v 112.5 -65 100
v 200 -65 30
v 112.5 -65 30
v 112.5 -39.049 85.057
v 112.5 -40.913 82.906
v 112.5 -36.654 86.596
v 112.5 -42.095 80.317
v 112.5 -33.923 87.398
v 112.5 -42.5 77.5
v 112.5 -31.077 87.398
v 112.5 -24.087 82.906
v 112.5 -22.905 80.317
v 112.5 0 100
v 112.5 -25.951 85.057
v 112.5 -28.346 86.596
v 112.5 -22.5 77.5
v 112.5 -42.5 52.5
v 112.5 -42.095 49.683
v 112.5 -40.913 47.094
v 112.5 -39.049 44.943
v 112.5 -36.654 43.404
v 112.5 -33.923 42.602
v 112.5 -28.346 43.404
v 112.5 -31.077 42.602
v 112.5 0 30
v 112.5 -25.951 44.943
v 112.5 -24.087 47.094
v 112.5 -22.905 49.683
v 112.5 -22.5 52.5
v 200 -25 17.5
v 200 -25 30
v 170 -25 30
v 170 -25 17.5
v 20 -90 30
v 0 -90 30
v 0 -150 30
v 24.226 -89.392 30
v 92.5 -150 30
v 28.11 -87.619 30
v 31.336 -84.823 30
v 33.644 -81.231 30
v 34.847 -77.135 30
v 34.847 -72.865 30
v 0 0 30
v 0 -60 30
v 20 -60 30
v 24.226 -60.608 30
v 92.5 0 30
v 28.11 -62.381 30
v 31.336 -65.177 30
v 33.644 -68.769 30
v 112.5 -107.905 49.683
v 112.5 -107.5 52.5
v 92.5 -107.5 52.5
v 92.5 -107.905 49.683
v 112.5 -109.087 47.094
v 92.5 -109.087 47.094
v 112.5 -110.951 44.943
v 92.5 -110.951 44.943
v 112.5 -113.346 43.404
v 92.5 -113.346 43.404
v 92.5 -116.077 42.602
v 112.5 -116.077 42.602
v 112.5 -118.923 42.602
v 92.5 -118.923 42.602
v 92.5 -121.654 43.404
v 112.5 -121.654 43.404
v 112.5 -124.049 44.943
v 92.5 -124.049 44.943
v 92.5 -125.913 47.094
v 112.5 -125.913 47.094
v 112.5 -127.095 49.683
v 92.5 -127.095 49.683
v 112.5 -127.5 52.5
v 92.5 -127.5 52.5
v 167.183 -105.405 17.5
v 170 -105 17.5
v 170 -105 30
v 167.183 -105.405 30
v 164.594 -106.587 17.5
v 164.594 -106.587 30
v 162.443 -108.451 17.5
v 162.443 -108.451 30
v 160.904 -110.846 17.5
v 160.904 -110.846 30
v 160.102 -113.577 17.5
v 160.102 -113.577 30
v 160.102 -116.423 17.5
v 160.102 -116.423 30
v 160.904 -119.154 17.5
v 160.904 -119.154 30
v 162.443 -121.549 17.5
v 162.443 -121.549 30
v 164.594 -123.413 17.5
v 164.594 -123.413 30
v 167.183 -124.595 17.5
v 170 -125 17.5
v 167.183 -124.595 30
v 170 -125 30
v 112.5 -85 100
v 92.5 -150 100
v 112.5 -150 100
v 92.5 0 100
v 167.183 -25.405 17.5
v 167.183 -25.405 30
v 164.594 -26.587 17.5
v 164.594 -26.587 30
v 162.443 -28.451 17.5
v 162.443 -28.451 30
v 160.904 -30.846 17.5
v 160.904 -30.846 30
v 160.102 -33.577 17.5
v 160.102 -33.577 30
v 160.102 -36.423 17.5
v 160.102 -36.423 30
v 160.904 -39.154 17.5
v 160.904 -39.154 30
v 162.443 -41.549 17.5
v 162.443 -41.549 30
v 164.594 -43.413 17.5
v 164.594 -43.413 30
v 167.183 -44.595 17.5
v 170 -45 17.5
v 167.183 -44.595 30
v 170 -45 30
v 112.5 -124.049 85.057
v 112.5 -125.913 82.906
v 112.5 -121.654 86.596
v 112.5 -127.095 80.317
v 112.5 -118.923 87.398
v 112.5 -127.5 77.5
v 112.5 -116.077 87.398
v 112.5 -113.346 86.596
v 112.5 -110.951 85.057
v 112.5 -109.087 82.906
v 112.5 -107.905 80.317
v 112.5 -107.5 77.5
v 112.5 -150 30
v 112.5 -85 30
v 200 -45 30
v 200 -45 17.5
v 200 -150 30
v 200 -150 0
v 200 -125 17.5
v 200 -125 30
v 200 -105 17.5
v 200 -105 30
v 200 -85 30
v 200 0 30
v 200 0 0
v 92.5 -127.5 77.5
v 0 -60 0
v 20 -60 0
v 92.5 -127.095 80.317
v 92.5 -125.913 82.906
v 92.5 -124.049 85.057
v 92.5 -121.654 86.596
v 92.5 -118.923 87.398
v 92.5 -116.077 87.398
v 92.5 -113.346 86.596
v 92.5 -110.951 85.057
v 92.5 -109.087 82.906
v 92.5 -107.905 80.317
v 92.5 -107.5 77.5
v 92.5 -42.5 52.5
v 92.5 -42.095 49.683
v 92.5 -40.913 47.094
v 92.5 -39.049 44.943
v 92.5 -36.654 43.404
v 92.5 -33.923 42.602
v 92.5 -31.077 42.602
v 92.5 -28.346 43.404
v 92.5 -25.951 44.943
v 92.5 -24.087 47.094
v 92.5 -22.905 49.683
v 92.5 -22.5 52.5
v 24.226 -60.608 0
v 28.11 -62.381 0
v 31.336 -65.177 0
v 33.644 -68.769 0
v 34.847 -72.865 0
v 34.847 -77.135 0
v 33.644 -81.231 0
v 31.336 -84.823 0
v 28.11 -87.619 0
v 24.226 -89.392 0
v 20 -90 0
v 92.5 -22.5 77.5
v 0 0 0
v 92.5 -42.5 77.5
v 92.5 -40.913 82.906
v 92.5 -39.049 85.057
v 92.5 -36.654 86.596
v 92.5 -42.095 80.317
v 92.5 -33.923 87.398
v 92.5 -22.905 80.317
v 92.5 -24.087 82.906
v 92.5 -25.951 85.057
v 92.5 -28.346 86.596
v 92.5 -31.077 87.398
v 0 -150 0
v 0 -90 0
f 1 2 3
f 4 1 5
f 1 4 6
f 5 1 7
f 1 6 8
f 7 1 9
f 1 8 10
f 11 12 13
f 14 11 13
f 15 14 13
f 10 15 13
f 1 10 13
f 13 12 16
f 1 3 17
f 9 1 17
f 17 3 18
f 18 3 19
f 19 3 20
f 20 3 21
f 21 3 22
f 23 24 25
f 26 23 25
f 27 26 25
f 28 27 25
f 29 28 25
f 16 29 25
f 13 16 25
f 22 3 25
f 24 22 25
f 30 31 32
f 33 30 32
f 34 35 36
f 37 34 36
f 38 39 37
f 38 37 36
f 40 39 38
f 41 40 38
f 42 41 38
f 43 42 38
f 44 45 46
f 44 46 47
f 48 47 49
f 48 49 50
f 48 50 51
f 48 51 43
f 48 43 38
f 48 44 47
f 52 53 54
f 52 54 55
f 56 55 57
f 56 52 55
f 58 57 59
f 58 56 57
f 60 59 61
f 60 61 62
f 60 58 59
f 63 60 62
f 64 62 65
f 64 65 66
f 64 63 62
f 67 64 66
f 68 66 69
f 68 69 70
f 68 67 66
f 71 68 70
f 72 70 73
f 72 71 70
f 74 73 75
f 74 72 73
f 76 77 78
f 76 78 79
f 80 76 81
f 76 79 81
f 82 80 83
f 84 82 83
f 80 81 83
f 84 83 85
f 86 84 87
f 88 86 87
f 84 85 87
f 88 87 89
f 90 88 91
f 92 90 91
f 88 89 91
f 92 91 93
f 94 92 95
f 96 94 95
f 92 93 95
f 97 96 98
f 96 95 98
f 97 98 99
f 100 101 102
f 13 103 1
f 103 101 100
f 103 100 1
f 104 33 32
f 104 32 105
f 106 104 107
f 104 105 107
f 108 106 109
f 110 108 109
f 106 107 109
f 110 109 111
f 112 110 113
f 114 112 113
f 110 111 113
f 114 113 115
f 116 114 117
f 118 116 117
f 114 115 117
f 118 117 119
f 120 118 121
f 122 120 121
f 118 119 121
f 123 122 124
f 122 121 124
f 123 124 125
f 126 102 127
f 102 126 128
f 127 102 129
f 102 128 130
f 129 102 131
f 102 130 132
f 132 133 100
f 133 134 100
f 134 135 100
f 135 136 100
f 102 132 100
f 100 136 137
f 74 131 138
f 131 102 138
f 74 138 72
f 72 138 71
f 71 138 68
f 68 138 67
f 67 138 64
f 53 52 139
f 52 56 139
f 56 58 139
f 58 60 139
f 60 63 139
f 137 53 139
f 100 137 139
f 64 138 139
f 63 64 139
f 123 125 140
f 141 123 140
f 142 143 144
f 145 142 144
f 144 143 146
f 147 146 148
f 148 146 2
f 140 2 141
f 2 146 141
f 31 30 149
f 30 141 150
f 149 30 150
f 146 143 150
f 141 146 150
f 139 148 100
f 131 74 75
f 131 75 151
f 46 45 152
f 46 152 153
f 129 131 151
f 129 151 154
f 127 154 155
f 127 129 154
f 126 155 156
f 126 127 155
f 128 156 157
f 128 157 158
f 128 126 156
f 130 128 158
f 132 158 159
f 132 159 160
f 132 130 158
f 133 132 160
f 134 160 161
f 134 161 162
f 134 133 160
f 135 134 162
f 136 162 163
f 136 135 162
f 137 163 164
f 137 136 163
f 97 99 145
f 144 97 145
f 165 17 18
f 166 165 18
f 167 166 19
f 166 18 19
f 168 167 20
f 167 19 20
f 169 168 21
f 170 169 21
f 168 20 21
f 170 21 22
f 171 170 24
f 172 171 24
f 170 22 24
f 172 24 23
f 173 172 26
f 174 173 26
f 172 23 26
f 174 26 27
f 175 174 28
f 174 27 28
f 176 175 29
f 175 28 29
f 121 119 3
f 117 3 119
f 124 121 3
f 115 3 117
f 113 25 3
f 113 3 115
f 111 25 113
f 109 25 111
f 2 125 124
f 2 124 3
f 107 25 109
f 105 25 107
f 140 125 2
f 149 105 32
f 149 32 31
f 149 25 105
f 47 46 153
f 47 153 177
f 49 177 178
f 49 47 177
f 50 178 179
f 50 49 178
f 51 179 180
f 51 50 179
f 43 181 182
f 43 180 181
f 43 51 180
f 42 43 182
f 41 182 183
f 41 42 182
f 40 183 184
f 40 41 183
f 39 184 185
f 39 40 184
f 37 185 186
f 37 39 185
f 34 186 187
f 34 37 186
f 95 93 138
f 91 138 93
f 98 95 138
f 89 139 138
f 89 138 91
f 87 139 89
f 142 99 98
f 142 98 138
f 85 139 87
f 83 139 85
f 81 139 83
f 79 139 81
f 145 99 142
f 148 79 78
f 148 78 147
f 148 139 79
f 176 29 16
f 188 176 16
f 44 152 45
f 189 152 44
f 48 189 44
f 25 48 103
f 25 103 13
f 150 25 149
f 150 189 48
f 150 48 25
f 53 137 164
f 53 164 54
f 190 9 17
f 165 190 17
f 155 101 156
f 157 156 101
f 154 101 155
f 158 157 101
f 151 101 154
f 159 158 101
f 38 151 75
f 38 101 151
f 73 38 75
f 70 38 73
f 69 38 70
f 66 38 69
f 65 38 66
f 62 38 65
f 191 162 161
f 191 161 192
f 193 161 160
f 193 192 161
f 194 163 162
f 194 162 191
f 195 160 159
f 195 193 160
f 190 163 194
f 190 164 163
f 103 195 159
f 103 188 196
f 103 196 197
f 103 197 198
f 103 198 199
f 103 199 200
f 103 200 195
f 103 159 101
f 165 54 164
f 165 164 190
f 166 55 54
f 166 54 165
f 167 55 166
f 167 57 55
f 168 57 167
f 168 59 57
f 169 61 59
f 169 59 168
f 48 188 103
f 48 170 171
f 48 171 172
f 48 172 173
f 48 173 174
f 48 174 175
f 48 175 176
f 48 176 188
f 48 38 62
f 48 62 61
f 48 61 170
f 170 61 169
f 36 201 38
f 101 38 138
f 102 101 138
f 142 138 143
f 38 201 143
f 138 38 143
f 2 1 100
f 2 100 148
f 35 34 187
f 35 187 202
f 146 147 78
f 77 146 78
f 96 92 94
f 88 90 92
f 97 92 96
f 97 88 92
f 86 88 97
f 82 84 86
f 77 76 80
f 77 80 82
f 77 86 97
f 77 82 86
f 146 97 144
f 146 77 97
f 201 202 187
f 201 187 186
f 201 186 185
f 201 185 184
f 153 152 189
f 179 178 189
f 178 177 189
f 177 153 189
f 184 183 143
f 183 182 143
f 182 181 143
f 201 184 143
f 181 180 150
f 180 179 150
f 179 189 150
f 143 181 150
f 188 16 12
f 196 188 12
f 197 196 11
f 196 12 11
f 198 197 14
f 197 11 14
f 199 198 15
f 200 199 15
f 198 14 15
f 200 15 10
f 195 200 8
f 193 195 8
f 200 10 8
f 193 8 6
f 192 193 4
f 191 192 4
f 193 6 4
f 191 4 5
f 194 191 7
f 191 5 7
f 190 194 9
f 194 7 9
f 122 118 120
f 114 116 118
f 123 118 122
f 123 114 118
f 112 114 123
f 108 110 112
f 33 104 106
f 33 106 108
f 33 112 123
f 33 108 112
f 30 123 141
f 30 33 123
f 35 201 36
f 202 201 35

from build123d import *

# Parameters (mm, degrees)
SKETCH_1_W          = 200
SKETCH_1_H          = 150
EXTRUDE_1_DEPTH     = 30
CUT_EXTRUDE_7_DEPTH = 12.5
CUT_EXTRUDE_8_DEPTH = 252.79356624
SKETCH_6_W          = 20
SKETCH_6_H          = 150
EXTRUDE_2_DEPTH     = 70
EXTRUDE_START       = -85
EXTRUDE_4_DEPTH     = 20
CUT_EXTRUDE_9_DEPTH = 20


with BuildPart() as part:
    # Эскиз1 → Бобышка-Вытянуть1 (new body)
    with BuildSketch(Plane.XY):
        with Locations((100, -75)):
            Rectangle(SKETCH_1_W, SKETCH_1_H)
    extrude(amount=EXTRUDE_1_DEPTH)

    # Эскиз2 → Вырез-Вытянуть7 (cut)
    with BuildSketch(Plane.XY.offset(30)):
        with BuildLine():
            Line((200, -105), (170, -105))
            ThreePointArc((170, -105), (160, -115), (170, -125))
            Line((170, -125), (200, -125))
            Line((200, -125), (200, -105))
        make_face()
        with BuildLine():
            Line((200, -25), (170, -25))
            ThreePointArc((170, -25), (160, -35), (170, -45))
            Line((170, -45), (200, -45))
            Line((200, -45), (200, -25))
        make_face()
    extrude(amount=-CUT_EXTRUDE_7_DEPTH, mode=Mode.SUBTRACT)

    # Эскиз5 → Вырез-Вытянуть8 (cut, through all)
    with BuildSketch(Plane.XY.offset(30)):
        with BuildLine():
            Line((0, -60), (20, -60))
            ThreePointArc((20, -60), (35, -75), (20, -90))
            Line((20, -90), (0, -90))
            Line((0, -90), (0, -60))
        make_face()
    extrude(amount=-CUT_EXTRUDE_8_DEPTH, mode=Mode.SUBTRACT)

    # Эскиз6 → Бобышка-Вытянуть2 (add)
    with BuildSketch(Plane.XY.offset(30)):
        with Locations((102.5, -75)):
            Rectangle(SKETCH_6_W, SKETCH_6_H)
    extrude(amount=EXTRUDE_2_DEPTH)

    # Эскиз7 → Бобышка-Вытянуть4 (add)
    with BuildSketch(Plane.XZ.offset(150).offset(EXTRUDE_START)):
        Polygon((112.5, 100), (200, 30), (112.5, 30), align=None)
    extrude(amount=EXTRUDE_4_DEPTH)

    # Эскиз10 → Вырез-Вытянуть9 (cut)
    with BuildSketch(Plane(origin=(112.5, 0, 0), x_dir=(0, 0, -1), z_dir=(1, 0, 0))):
        with BuildLine():
            Line((-52.5, -127.5), (-77.5, -127.5))
            ThreePointArc((-77.5, -127.5), (-87.5, -117.5), (-77.5, -107.5))
            Line((-77.5, -107.5), (-52.5, -107.5))
            ThreePointArc((-52.5, -107.5), (-42.5, -117.5), (-52.5, -127.5))
        make_face()
        with BuildLine():
            Line((-52.5, -22.5), (-77.5, -22.5))
            ThreePointArc((-77.5, -22.5), (-87.5, -32.5), (-77.5, -42.5))
            Line((-77.5, -42.5), (-52.5, -42.5))
            ThreePointArc((-52.5, -42.5), (-42.5, -32.5), (-52.5, -22.5))
        make_face()
    extrude(amount=-CUT_EXTRUDE_9_DEPTH, mode=Mode.SUBTRACT)


solid = part.part
